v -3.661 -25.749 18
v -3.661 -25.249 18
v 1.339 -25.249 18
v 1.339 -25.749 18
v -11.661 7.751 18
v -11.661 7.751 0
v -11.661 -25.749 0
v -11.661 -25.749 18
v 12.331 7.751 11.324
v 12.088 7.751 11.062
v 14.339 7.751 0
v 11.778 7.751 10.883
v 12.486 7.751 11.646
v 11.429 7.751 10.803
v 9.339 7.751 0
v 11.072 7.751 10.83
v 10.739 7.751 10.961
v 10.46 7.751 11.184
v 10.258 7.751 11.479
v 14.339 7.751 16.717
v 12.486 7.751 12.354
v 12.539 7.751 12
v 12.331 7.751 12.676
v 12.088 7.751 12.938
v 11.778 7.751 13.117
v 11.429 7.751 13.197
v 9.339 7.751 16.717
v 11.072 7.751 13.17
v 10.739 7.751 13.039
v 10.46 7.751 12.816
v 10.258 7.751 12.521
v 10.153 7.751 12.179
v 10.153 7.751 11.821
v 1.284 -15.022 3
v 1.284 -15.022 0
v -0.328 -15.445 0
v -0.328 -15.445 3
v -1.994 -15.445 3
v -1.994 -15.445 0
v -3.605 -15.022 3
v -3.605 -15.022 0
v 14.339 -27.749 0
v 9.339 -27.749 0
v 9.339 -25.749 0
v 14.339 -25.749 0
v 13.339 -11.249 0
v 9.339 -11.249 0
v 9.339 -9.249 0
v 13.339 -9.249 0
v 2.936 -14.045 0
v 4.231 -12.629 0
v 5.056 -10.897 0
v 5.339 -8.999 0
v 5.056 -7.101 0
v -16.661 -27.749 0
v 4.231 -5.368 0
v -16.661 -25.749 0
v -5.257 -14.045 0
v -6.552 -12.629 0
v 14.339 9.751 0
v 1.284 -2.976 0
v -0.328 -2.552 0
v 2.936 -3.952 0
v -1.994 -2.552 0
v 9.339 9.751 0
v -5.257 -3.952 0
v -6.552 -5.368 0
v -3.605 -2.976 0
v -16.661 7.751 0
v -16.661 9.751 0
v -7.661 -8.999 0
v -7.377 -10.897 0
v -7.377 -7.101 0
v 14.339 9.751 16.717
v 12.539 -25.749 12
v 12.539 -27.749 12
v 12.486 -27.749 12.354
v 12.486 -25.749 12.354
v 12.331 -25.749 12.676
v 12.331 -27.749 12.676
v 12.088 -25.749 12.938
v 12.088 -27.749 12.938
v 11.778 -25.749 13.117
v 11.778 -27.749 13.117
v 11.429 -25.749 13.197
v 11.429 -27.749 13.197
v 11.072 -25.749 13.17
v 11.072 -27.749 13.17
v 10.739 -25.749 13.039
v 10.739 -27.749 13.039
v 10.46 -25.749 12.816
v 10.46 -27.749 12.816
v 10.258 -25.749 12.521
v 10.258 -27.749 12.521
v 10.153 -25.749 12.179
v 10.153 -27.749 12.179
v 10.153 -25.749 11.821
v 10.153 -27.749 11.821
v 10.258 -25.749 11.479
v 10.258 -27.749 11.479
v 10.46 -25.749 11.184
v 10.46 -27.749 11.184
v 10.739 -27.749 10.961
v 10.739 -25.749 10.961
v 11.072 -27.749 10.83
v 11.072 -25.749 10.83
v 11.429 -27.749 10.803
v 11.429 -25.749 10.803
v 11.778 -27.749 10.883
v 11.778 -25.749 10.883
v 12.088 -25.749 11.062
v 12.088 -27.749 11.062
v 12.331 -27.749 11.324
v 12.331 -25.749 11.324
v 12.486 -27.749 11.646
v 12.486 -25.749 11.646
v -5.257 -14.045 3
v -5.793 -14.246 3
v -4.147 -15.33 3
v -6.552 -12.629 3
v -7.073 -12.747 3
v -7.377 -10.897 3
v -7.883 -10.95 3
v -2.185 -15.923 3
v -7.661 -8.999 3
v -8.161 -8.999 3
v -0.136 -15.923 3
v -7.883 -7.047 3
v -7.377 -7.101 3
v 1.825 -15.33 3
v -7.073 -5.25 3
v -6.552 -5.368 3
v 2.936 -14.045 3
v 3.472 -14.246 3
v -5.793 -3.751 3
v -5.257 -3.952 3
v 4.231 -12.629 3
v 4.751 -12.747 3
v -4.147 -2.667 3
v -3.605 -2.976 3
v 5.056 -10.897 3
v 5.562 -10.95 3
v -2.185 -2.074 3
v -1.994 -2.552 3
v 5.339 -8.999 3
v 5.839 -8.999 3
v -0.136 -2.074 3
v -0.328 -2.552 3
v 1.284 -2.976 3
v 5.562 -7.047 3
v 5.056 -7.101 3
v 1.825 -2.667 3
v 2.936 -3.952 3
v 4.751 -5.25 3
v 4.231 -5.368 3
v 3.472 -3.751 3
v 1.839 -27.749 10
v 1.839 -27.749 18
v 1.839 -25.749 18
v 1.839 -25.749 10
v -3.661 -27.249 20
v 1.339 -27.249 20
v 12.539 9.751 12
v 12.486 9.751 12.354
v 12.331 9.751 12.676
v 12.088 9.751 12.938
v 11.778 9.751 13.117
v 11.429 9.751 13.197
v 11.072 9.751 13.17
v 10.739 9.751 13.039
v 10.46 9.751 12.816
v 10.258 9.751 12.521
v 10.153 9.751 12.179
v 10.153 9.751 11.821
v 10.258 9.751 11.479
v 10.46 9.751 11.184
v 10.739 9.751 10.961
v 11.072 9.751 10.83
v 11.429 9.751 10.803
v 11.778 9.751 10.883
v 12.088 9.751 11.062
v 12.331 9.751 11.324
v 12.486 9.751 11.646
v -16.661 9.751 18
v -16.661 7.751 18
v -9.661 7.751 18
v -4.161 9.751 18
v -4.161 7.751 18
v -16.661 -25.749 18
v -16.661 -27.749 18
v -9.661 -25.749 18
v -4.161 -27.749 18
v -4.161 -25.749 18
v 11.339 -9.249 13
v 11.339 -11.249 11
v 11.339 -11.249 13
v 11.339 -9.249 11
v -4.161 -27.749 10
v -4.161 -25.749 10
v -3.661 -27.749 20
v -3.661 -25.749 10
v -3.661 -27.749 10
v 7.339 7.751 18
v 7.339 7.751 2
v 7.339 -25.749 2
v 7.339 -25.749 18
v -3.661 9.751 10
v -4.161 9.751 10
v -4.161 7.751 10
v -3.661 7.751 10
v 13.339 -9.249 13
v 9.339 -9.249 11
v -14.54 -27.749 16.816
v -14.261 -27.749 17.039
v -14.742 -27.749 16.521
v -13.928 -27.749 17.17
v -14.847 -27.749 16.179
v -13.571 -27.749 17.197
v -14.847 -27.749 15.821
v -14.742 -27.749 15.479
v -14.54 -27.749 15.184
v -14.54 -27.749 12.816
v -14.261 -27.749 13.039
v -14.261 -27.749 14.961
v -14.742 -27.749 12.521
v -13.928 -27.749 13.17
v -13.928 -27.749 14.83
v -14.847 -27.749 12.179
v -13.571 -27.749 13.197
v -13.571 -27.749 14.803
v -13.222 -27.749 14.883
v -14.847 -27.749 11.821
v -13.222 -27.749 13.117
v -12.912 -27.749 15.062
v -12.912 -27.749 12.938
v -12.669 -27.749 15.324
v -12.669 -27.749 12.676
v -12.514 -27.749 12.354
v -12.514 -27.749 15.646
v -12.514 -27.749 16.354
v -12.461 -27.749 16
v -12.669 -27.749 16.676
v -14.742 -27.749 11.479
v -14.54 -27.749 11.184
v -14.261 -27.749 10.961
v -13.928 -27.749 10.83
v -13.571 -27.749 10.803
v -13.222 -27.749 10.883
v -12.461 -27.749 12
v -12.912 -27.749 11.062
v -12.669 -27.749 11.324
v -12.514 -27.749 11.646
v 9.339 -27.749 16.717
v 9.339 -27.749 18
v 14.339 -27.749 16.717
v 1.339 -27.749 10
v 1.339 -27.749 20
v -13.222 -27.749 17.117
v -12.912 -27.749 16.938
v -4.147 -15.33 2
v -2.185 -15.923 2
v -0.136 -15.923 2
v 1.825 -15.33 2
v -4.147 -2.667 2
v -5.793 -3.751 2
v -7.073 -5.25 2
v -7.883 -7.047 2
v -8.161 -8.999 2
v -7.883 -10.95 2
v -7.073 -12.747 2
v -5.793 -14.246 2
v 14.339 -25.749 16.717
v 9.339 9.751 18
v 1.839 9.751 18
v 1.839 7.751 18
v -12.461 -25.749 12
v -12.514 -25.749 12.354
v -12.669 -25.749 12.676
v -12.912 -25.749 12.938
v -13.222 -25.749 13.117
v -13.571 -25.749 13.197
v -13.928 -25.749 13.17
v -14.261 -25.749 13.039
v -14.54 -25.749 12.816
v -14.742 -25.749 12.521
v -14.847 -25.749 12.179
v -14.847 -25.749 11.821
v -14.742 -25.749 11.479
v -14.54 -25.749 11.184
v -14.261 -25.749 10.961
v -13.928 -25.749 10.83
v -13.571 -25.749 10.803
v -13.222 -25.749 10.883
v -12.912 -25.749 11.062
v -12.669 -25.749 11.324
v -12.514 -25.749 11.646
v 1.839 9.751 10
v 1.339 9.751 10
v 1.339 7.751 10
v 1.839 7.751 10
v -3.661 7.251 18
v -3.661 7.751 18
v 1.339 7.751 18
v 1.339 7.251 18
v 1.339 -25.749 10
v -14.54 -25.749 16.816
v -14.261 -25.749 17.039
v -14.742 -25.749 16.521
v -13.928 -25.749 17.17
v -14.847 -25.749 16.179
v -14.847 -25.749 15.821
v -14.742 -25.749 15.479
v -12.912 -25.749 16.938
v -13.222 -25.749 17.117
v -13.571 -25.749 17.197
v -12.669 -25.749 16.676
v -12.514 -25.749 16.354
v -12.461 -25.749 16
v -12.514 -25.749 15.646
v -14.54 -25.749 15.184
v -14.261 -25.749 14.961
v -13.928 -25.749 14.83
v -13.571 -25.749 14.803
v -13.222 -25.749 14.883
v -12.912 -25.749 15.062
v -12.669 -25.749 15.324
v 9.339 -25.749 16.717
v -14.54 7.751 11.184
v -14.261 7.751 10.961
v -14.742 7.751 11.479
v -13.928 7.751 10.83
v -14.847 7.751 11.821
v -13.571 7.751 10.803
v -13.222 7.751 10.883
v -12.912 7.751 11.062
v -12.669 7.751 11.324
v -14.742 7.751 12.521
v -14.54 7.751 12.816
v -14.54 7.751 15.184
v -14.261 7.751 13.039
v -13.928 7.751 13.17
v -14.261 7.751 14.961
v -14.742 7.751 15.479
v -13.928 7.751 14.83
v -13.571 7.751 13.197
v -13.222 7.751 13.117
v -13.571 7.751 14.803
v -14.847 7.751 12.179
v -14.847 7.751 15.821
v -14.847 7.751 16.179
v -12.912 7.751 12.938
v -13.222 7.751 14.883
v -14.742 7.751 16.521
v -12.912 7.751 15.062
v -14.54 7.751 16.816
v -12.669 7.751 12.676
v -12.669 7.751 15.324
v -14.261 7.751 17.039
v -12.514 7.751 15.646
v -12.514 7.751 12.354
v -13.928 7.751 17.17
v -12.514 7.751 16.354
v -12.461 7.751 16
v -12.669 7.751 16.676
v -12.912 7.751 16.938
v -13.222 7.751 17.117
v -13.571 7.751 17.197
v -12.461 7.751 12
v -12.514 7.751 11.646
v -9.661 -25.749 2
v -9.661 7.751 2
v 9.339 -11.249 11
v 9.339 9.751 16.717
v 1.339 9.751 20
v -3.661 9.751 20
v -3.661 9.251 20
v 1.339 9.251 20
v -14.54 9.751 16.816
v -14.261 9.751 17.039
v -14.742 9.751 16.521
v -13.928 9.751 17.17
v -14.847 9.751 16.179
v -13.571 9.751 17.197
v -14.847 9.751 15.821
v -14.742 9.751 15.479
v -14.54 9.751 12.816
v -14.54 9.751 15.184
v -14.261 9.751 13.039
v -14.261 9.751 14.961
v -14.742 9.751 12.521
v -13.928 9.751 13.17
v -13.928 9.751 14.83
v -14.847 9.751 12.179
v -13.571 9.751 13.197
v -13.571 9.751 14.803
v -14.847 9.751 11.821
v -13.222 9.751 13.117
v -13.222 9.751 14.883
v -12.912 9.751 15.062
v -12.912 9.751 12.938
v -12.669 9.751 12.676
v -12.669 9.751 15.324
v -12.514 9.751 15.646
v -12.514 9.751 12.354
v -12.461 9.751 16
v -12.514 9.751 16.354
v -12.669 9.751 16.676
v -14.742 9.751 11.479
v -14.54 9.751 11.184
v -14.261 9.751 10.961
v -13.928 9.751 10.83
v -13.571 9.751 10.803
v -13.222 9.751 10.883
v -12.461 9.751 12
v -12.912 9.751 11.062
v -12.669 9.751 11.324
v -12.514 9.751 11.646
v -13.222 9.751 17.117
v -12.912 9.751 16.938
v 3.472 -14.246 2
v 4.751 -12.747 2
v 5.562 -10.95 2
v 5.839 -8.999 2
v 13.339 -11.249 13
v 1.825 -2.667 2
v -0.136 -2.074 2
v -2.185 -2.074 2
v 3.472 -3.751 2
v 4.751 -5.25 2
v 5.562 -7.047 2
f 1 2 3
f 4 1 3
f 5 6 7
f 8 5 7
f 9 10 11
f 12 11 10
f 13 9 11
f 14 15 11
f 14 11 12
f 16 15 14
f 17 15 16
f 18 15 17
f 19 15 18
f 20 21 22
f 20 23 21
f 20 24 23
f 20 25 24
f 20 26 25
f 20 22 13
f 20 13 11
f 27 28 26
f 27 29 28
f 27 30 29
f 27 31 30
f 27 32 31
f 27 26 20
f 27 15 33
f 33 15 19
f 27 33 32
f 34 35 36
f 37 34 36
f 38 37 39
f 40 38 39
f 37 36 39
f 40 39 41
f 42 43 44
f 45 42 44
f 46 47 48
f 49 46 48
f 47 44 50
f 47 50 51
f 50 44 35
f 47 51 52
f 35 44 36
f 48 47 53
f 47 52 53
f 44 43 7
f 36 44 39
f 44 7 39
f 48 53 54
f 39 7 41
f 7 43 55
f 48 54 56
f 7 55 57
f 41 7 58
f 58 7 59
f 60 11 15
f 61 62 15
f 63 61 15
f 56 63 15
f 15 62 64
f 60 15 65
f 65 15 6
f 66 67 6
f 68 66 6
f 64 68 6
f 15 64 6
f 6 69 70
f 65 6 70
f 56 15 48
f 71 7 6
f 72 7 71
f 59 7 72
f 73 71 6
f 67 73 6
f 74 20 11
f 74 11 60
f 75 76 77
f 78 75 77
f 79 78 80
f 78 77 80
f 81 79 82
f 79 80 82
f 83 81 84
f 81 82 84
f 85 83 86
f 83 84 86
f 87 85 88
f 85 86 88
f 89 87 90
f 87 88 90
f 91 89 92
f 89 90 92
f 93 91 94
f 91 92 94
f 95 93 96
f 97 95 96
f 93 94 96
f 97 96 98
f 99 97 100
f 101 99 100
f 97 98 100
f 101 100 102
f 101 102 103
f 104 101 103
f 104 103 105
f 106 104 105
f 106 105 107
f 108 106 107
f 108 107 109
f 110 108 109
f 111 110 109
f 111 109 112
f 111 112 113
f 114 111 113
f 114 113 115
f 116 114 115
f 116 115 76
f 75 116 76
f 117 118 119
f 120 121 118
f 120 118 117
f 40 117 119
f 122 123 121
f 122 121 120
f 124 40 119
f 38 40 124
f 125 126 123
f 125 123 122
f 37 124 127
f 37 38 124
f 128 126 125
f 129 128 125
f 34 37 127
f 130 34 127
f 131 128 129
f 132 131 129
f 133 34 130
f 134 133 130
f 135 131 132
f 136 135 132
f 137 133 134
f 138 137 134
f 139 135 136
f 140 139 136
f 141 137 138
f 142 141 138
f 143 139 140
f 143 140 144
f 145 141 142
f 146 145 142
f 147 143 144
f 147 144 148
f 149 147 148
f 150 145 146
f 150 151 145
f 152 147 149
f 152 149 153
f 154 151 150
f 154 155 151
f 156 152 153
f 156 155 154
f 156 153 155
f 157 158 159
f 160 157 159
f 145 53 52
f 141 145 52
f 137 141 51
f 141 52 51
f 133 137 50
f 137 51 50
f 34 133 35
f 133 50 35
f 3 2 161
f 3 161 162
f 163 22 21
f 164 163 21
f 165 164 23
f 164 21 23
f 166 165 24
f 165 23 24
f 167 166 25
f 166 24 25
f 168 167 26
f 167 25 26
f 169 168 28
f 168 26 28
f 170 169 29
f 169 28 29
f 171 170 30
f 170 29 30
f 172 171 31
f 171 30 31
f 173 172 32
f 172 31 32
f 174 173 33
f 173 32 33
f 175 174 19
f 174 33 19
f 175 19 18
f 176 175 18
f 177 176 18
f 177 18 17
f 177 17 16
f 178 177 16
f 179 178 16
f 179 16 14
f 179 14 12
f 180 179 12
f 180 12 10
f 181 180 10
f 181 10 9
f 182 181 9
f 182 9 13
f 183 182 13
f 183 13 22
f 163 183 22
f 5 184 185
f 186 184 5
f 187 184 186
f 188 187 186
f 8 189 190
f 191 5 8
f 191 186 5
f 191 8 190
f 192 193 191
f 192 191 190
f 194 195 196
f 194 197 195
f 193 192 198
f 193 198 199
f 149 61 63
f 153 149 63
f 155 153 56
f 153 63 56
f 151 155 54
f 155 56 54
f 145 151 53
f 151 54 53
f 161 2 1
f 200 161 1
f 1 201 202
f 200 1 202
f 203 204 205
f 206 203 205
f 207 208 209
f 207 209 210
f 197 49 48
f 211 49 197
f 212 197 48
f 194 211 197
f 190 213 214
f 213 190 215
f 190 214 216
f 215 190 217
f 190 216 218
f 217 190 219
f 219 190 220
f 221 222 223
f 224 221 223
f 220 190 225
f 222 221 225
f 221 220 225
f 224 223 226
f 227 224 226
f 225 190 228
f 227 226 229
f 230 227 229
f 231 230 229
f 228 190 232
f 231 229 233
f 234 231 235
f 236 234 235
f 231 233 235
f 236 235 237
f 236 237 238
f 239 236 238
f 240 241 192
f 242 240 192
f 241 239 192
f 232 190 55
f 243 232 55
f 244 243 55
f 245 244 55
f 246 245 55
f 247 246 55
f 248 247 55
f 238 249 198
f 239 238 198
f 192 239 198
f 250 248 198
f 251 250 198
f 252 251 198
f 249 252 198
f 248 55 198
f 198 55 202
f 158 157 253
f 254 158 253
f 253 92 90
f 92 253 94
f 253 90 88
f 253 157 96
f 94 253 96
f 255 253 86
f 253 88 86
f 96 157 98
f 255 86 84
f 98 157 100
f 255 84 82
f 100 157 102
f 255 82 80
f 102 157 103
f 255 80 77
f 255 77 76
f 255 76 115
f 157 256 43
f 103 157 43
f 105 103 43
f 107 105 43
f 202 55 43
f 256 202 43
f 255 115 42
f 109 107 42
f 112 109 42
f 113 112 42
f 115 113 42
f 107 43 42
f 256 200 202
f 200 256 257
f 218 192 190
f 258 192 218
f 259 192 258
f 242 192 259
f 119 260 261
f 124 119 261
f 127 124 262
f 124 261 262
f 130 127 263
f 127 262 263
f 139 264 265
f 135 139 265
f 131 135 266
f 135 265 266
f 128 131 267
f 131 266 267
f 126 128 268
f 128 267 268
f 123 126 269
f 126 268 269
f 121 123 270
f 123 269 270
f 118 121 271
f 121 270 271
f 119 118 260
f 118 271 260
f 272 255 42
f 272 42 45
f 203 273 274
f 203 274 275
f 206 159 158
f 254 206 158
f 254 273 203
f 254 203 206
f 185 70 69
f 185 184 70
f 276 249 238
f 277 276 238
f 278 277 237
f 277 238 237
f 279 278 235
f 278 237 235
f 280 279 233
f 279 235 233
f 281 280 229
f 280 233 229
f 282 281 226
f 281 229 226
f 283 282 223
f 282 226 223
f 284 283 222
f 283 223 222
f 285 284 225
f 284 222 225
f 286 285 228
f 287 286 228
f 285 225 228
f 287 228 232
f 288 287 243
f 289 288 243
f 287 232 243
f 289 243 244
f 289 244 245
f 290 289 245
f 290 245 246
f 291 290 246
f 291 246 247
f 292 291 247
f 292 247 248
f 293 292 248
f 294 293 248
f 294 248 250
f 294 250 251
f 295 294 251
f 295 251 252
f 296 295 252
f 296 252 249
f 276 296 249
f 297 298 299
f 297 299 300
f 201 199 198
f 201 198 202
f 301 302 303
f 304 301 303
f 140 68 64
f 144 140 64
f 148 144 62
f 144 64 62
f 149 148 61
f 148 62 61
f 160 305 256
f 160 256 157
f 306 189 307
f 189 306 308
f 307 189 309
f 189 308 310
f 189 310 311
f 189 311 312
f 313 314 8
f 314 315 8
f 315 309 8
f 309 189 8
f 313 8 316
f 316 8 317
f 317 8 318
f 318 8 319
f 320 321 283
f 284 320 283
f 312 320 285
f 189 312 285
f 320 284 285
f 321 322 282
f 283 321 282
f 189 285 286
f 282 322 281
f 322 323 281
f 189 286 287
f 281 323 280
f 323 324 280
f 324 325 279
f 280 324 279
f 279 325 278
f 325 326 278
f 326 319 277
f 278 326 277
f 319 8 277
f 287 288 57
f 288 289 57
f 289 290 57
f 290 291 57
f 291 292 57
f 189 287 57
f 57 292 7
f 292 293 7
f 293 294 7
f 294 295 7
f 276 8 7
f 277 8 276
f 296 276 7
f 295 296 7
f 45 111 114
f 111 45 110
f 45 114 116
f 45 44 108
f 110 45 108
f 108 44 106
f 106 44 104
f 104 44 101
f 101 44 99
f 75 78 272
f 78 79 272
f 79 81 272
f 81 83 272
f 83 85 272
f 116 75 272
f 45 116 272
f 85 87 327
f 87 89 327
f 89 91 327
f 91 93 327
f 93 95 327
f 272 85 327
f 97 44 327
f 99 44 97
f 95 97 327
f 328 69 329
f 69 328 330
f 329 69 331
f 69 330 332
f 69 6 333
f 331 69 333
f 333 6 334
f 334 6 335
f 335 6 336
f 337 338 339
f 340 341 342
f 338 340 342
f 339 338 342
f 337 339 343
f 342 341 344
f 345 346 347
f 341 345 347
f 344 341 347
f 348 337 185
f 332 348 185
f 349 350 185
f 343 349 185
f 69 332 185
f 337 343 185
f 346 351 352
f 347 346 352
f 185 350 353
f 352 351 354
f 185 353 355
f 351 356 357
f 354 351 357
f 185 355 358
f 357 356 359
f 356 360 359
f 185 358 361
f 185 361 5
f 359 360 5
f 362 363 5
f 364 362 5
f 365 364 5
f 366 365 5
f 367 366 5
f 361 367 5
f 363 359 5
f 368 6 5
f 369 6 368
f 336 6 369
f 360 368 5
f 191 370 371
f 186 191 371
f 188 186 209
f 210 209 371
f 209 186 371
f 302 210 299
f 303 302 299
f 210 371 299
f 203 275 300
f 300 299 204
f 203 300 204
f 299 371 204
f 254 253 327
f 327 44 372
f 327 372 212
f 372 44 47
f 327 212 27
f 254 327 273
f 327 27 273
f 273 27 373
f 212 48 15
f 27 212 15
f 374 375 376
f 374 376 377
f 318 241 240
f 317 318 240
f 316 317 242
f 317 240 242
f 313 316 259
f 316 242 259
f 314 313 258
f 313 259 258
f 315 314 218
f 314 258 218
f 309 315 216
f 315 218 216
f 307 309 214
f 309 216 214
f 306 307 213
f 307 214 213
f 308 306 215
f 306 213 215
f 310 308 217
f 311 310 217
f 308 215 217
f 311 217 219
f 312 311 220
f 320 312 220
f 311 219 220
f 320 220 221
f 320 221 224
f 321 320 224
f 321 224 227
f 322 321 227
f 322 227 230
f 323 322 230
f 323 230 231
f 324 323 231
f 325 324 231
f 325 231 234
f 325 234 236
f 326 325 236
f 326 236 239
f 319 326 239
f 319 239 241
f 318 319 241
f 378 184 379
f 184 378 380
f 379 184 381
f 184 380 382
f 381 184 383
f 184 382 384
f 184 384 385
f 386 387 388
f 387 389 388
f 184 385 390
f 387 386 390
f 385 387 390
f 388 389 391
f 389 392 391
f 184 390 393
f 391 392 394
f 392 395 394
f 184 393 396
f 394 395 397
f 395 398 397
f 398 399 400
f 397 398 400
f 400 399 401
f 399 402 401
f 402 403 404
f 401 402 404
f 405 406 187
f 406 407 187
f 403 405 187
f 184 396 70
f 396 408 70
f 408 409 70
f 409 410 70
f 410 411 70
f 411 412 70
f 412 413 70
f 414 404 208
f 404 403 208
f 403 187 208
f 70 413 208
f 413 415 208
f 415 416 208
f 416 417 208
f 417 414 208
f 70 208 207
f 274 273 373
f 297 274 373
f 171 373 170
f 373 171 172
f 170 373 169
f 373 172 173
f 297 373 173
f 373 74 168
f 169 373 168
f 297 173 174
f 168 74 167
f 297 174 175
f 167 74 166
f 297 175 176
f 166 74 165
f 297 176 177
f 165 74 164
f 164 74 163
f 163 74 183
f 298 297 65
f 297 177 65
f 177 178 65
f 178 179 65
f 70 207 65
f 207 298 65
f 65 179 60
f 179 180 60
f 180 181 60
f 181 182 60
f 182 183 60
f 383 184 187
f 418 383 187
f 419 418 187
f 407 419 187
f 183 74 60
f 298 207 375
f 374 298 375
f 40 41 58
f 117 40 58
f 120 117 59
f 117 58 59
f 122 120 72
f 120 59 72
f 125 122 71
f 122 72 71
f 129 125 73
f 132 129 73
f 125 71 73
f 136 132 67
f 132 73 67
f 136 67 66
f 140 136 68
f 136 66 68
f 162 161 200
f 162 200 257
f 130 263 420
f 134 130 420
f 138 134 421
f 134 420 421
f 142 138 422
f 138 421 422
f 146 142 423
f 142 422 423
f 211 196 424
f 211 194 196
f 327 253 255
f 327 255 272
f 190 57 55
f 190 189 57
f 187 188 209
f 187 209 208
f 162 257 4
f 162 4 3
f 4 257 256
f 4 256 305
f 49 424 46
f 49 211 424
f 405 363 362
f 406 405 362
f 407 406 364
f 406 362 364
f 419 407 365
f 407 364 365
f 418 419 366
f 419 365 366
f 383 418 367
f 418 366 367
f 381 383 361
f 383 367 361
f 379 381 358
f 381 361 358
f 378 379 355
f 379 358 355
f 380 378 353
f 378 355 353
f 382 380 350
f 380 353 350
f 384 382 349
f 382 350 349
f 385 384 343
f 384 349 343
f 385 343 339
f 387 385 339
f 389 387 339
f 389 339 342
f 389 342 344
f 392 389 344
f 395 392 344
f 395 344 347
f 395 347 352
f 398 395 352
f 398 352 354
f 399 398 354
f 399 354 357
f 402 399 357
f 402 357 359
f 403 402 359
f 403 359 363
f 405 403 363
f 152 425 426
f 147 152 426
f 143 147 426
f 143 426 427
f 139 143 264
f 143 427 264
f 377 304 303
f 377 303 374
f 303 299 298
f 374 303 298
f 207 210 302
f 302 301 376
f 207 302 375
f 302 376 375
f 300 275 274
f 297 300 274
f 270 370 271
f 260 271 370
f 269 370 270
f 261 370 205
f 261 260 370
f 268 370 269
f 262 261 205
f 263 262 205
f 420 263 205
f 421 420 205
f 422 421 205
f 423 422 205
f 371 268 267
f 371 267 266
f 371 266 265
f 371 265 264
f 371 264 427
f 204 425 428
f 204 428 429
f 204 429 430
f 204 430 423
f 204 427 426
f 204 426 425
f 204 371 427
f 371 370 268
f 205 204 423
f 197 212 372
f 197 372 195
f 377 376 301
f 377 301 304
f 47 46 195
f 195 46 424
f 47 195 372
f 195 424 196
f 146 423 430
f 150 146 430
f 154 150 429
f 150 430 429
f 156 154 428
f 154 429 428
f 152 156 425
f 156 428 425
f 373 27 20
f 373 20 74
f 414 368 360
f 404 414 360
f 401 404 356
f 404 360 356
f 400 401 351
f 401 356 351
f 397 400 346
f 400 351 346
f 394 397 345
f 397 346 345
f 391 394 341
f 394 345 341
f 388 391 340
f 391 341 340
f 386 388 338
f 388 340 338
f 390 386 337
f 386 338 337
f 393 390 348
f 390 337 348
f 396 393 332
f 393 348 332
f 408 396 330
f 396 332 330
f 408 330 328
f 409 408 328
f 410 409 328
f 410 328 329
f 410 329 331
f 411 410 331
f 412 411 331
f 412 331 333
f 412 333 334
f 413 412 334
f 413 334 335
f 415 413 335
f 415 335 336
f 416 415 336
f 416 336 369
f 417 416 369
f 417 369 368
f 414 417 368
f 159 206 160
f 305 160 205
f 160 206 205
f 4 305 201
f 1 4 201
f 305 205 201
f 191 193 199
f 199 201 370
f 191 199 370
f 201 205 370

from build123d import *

# Parameters (mm, degrees)
F1_DEPTH  = 2
F2_DEPTH  = 18
F3_DEPTH  = 3
F4_W      = 2
F4_H      = 5
F4_H_2    = 13
F5_DEPTH  = 5
F6_W      = 2
F6_H      = 16.7173967883
F7_DEPTH  = 5
F8_R      = 1.2
F9_DEPTH  = 40
F12_DEPTH = 1
F13_W     = 5
F13_H     = 2
F13_H_2   = 0.5
F14_DEPTH = 2
F15_SIZE  = 1.99999
F13_W_2   = 0.5
F16_DEPTH = 8


# Not quite as in the source:
# - a fillet or chamfer is up to 0.001 mm smaller than in the source, because OpenCascade refuses the exact size


with BuildPart() as f1:
    # F0 (on Top) → F1 (new body)
    with BuildSketch(Plane.XY):
        Polygon((-5.1606558692, 9.7513413054), (-11.6606558692, 9.7513413054), (-11.6606558692, -27.7486586946), (-5.1606558692, -27.7486586946), (2.8393441308, -27.7486586946), (9.3393441308, -27.7486586946), (9.3393441308, 9.7513413054), (2.8393441308, 9.7513413054), align=None)
        Polygon((-9.6606558692, -1.2486586946), (-9.6606558692, 7.7513413054), (7.3393441308, 7.7513413054), (7.3393441308, -1.2486586946), (7.3393441308, -16.7486586946), (7.3393441308, -25.7486586946), (-9.6606558692, -25.7486586946), (-9.6606558692, -16.7486586946), align=None, mode=Mode.SUBTRACT)
        with BuildLine():
            Line((3.3125979801, -16.7486586946), (-5.6339097184, -16.7486586946))
            ThreePointArc((-5.6339097184, -16.7486586946), (-2.8409986659, -25.1856853401), (4.3393441308, -19.9486586946))
            ThreePointArc((4.3393441308, -19.9486586946), (4.0763707763, -18.2683158979), (3.3125979801, -16.7486586946))
        make_face()
        with BuildLine():
            ThreePointArc((4.3393441308, 1.9513413054), (-2.8409986659, 7.1883679509), (-5.6339097184, -1.2486586946))
            Line((-5.6339097184, -1.2486586946), (3.3125979801, -1.2486586946))
            ThreePointArc((3.3125979801, -1.2486586946), (4.0763707763, 0.2709985087), (4.3393441308, 1.9513413054))
        make_face()
        with BuildLine():
            Line((7.3393441308, 7.7513413054), (-9.6606558692, 7.7513413054))
            Line((-9.6606558692, 7.7513413054), (-9.6606558692, -1.2486586946))
            Line((-9.6606558692, -1.2486586946), (-5.6339097184, -1.2486586946))
            ThreePointArc((-5.6339097184, -1.2486586946), (-2.8409986659, 7.1883679509), (4.3393441308, 1.9513413054))
            ThreePointArc((4.3393441308, 1.9513413054), (4.0763707763, 0.2709985087), (3.3125979801, -1.2486586946))
            Line((3.3125979801, -1.2486586946), (7.3393441308, -1.2486586946))
            Line((7.3393441308, -1.2486586946), (7.3393441308, 7.7513413054))
        make_face()
        with BuildLine():
            Line((-5.6339097184, -16.7486586946), (-9.6606558692, -16.7486586946))
            Line((-9.6606558692, -16.7486586946), (-9.6606558692, -25.7486586946))
            Line((-9.6606558692, -25.7486586946), (7.3393441308, -25.7486586946))
            Line((7.3393441308, -25.7486586946), (7.3393441308, -16.7486586946))
            Line((7.3393441308, -16.7486586946), (3.3125979801, -16.7486586946))
            ThreePointArc((3.3125979801, -16.7486586946), (4.0763707763, -18.2683158979), (4.3393441308, -19.9486586946))
            ThreePointArc((4.3393441308, -19.9486586946), (-2.8409986659, -25.1856853401), (-5.6339097184, -16.7486586946))
        make_face()
        with BuildLine():
            Line((7.3393441308, -16.7486586946), (7.3393441308, -1.2486586946))
            Line((7.3393441308, -1.2486586946), (3.3125979801, -1.2486586946))
            ThreePointArc((3.3125979801, -1.2486586946), (2.6358545698, -2.028169781), (1.8253711817, -2.667494311))
            ThreePointArc((1.8253711817, -2.667494311), (4.751289215, -5.2504717566), (5.8393441308, -8.9986586946))
            ThreePointArc((5.8393441308, -8.9986586946), (4.751289215, -12.7468456326), (1.8253711817, -15.3298230782))
            ThreePointArc((1.8253711817, -15.3298230782), (2.6358545698, -15.9691476082), (3.3125979801, -16.7486586946))
            Line((3.3125979801, -16.7486586946), (7.3393441308, -16.7486586946))
        make_face()
        with BuildLine():
            Line((-5.6339097184, -1.2486586946), (-9.6606558692, -1.2486586946))
            Line((-9.6606558692, -1.2486586946), (-9.6606558692, -16.7486586946))
            Line((-9.6606558692, -16.7486586946), (-5.6339097184, -16.7486586946))
            ThreePointArc((-5.6339097184, -16.7486586946), (-4.9571663082, -15.9691476082), (-4.14668292, -15.3298230782))
            ThreePointArc((-4.14668292, -15.3298230782), (-8.1606558692, -8.9986586946), (-4.14668292, -2.667494311))
            ThreePointArc((-4.14668292, -2.667494311), (-4.9571663082, -2.028169781), (-5.6339097184, -1.2486586946))
        make_face()
        with BuildLine():
            Line((3.3125979801, -1.2486586946), (-5.6339097184, -1.2486586946))
            ThreePointArc((-5.6339097184, -1.2486586946), (-4.9571663082, -2.028169781), (-4.14668292, -2.667494311))
            ThreePointArc((-4.14668292, -2.667494311), (-1.1606558692, -1.9986586946), (1.8253711817, -2.667494311))
            ThreePointArc((1.8253711817, -2.667494311), (2.6358545698, -2.028169781), (3.3125979801, -1.2486586946))
        make_face()
        with BuildLine():
            ThreePointArc((-4.14668292, -15.3298230782), (-4.9571663082, -15.9691476082), (-5.6339097184, -16.7486586946))
            Line((-5.6339097184, -16.7486586946), (3.3125979801, -16.7486586946))
            ThreePointArc((3.3125979801, -16.7486586946), (2.6358545698, -15.9691476082), (1.8253711817, -15.3298230782))
            ThreePointArc((1.8253711817, -15.3298230782), (-1.1606558692, -15.9986586946), (-4.14668292, -15.3298230782))
        make_face()
    extrude(amount=F1_DEPTH)

    # F0 (on Top) → F2 (join)
    with BuildSketch(Plane.XY):
        Polygon((-5.1606558692, 9.7513413054), (-11.6606558692, 9.7513413054), (-11.6606558692, -27.7486586946), (-5.1606558692, -27.7486586946), (2.8393441308, -27.7486586946), (9.3393441308, -27.7486586946), (9.3393441308, 9.7513413054), (2.8393441308, 9.7513413054), align=None)
        Polygon((-9.6606558692, -1.2486586946), (-9.6606558692, 7.7513413054), (7.3393441308, 7.7513413054), (7.3393441308, -1.2486586946), (7.3393441308, -16.7486586946), (7.3393441308, -25.7486586946), (-9.6606558692, -25.7486586946), (-9.6606558692, -16.7486586946), align=None, mode=Mode.SUBTRACT)
    extrude(amount=F2_DEPTH)

    # F0 (on Top) → F3 (join)
    with BuildSketch(Plane.XY):
        with BuildLine():
            ThreePointArc((-3.604859431, -2.9757134891), (-3.8801412786, -2.8292861752), (-4.14668292, -2.667494311))
            ThreePointArc((-4.14668292, -2.667494311), (-8.1606558692, -8.9986586946), (-4.14668292, -15.3298230782))
            ThreePointArc((-4.14668292, -15.3298230782), (-3.8801412786, -15.1680312141), (-3.604859431, -15.0216039001))
            ThreePointArc((-3.604859431, -15.0216039001), (-7.6606558692, -8.9986586946), (-3.604859431, -2.9757134891))
        make_face()
        with BuildLine():
            ThreePointArc((1.8253711817, -2.667494311), (-1.1606558692, -1.9986586946), (-4.14668292, -2.667494311))
            ThreePointArc((-4.14668292, -2.667494311), (-3.8801412786, -2.8292861752), (-3.604859431, -2.9757134891))
            ThreePointArc((-3.604859431, -2.9757134891), (-1.1606558692, -2.4986586946), (1.2835476927, -2.9757134891))
            ThreePointArc((1.2835476927, -2.9757134891), (1.5588295403, -2.8292861752), (1.8253711817, -2.667494311))
        make_face()
        with BuildLine():
            ThreePointArc((5.8393441308, -8.9986586946), (4.751289215, -5.2504717566), (1.8253711817, -2.667494311))
            ThreePointArc((1.8253711817, -2.667494311), (1.5588295403, -2.8292861752), (1.2835476927, -2.9757134891))
            ThreePointArc((1.2835476927, -2.9757134891), (4.2308802362, -5.3680473929), (5.3393441308, -8.9986586946))
            ThreePointArc((5.3393441308, -8.9986586946), (4.2308802362, -12.6292699963), (1.2835476927, -15.0216039001))
            ThreePointArc((1.2835476927, -15.0216039001), (1.5588295403, -15.1680312141), (1.8253711817, -15.3298230782))
            ThreePointArc((1.8253711817, -15.3298230782), (4.751289215, -12.7468456326), (5.8393441308, -8.9986586946))
        make_face()
        with BuildLine():
            ThreePointArc((-3.604859431, -15.0216039001), (-3.8801412786, -15.1680312141), (-4.14668292, -15.3298230782))
            ThreePointArc((-4.14668292, -15.3298230782), (-1.1606558692, -15.9986586946), (1.8253711817, -15.3298230782))
            ThreePointArc((1.8253711817, -15.3298230782), (1.5588295403, -15.1680312141), (1.2835476927, -15.0216039001))
            ThreePointArc((1.2835476927, -15.0216039001), (-1.1606558692, -15.4986586946), (-3.604859431, -15.0216039001))
        make_face()
    extrude(amount=F3_DEPTH)

    # F4 (on face) → F5 (join)
    with BuildSketch(Plane(origin=(-11.6606558692, 0, 0), x_dir=(0, -1, 0), z_dir=(-1, 0, 0))):
        with Locations((-8.7513413054, 2.5)):
            Rectangle(F4_W, F4_H)
        with Locations((-8.7513413054, 11.5)):
            Rectangle(F4_W, F4_H_2)
        with Locations((26.7486586946, 2.5)):
            Rectangle(F4_W, F4_H)
        with Locations((26.7486586946, 11.5)):
            Rectangle(F4_W, F4_H_2)
    extrude(amount=F5_DEPTH)

    # F6 (on face) → F7 (join)
    with BuildSketch(Plane.YZ.offset(9.3393441308)):
        with Locations((-26.7486586946, 8.3586983941)):
            Rectangle(F6_W, F6_H)
        with Locations((8.7513413054, 8.3586983941)):
            Rectangle(F6_W, F6_H)
    extrude(amount=F7_DEPTH)

    # F8 (on face) → F9 (cut)
    with BuildSketch(Plane.XZ.offset(27.7486586946)):
        with Locations((-13.6606558692, 12)):
            Circle(F8_R)
        with Locations((11.3393441308, 12)):
            Circle(F8_R)
        with Locations((-13.6606558692, 16)):
            Circle(F8_R)
    extrude(amount=-F9_DEPTH, mode=Mode.SUBTRACT)

    # F11 (on offset) → F12 (join, symmetric)
    with BuildSketch(Plane(origin=(0, -10.2486586946, 0), x_dir=(-1, 0, 0), z_dir=(0, 1, 0))):
        Polygon((-13.3393441308, 13), (-13.3393441308, 0), (-9.3393441308, 0), (-9.3393441308, 11), (-11.3393441308, 11), (-11.3393441308, 13), align=None)
    extrude(amount=F12_DEPTH, both=True)

    # F13 (on face) → F14 (join)
    with BuildSketch(Plane.XY.offset(18)):
        with Locations((-1.1606558692, -26.7486586946)):
            Rectangle(F13_W, F13_H)
        with Locations((-1.1606558692, -25.4986586946)):
            Rectangle(F13_W, F13_H_2)
        with Locations((-1.1606558692, 8.7513413054)):
            Rectangle(F13_W, F13_H)
        with Locations((-1.1606558692, 7.5013413054)):
            Rectangle(F13_W, F13_H_2)
    extrude(amount=F14_DEPTH)

    # F15 (size 2 in the source; OpenCascade refuses exactly that, so slightly less here)
    f15_edges = [f1.edges().sort_by_distance(p)[0] for p in [
        (-1.160656, -25.248659, 20),
        (-1.160656, 7.251341, 20),
    ]]
    chamfer(f15_edges, length=F15_SIZE)

    # F13 (on face) → F16 (cut)
    with BuildSketch(Plane.XY.offset(18)):
        with Locations((-3.9106558692, -26.7486586946)):
            Rectangle(F13_W_2, F13_H)
        with Locations((1.5893441308, -26.7486586946)):
            Rectangle(F13_W_2, F13_H)
        with Locations((1.5893441308, 8.7513413054)):
            Rectangle(F13_W_2, F13_H)
        with Locations((-3.9106558692, 8.7513413054)):
            Rectangle(F13_W_2, F13_H)
    extrude(amount=-F16_DEPTH, mode=Mode.SUBTRACT)


solid = f1.part
